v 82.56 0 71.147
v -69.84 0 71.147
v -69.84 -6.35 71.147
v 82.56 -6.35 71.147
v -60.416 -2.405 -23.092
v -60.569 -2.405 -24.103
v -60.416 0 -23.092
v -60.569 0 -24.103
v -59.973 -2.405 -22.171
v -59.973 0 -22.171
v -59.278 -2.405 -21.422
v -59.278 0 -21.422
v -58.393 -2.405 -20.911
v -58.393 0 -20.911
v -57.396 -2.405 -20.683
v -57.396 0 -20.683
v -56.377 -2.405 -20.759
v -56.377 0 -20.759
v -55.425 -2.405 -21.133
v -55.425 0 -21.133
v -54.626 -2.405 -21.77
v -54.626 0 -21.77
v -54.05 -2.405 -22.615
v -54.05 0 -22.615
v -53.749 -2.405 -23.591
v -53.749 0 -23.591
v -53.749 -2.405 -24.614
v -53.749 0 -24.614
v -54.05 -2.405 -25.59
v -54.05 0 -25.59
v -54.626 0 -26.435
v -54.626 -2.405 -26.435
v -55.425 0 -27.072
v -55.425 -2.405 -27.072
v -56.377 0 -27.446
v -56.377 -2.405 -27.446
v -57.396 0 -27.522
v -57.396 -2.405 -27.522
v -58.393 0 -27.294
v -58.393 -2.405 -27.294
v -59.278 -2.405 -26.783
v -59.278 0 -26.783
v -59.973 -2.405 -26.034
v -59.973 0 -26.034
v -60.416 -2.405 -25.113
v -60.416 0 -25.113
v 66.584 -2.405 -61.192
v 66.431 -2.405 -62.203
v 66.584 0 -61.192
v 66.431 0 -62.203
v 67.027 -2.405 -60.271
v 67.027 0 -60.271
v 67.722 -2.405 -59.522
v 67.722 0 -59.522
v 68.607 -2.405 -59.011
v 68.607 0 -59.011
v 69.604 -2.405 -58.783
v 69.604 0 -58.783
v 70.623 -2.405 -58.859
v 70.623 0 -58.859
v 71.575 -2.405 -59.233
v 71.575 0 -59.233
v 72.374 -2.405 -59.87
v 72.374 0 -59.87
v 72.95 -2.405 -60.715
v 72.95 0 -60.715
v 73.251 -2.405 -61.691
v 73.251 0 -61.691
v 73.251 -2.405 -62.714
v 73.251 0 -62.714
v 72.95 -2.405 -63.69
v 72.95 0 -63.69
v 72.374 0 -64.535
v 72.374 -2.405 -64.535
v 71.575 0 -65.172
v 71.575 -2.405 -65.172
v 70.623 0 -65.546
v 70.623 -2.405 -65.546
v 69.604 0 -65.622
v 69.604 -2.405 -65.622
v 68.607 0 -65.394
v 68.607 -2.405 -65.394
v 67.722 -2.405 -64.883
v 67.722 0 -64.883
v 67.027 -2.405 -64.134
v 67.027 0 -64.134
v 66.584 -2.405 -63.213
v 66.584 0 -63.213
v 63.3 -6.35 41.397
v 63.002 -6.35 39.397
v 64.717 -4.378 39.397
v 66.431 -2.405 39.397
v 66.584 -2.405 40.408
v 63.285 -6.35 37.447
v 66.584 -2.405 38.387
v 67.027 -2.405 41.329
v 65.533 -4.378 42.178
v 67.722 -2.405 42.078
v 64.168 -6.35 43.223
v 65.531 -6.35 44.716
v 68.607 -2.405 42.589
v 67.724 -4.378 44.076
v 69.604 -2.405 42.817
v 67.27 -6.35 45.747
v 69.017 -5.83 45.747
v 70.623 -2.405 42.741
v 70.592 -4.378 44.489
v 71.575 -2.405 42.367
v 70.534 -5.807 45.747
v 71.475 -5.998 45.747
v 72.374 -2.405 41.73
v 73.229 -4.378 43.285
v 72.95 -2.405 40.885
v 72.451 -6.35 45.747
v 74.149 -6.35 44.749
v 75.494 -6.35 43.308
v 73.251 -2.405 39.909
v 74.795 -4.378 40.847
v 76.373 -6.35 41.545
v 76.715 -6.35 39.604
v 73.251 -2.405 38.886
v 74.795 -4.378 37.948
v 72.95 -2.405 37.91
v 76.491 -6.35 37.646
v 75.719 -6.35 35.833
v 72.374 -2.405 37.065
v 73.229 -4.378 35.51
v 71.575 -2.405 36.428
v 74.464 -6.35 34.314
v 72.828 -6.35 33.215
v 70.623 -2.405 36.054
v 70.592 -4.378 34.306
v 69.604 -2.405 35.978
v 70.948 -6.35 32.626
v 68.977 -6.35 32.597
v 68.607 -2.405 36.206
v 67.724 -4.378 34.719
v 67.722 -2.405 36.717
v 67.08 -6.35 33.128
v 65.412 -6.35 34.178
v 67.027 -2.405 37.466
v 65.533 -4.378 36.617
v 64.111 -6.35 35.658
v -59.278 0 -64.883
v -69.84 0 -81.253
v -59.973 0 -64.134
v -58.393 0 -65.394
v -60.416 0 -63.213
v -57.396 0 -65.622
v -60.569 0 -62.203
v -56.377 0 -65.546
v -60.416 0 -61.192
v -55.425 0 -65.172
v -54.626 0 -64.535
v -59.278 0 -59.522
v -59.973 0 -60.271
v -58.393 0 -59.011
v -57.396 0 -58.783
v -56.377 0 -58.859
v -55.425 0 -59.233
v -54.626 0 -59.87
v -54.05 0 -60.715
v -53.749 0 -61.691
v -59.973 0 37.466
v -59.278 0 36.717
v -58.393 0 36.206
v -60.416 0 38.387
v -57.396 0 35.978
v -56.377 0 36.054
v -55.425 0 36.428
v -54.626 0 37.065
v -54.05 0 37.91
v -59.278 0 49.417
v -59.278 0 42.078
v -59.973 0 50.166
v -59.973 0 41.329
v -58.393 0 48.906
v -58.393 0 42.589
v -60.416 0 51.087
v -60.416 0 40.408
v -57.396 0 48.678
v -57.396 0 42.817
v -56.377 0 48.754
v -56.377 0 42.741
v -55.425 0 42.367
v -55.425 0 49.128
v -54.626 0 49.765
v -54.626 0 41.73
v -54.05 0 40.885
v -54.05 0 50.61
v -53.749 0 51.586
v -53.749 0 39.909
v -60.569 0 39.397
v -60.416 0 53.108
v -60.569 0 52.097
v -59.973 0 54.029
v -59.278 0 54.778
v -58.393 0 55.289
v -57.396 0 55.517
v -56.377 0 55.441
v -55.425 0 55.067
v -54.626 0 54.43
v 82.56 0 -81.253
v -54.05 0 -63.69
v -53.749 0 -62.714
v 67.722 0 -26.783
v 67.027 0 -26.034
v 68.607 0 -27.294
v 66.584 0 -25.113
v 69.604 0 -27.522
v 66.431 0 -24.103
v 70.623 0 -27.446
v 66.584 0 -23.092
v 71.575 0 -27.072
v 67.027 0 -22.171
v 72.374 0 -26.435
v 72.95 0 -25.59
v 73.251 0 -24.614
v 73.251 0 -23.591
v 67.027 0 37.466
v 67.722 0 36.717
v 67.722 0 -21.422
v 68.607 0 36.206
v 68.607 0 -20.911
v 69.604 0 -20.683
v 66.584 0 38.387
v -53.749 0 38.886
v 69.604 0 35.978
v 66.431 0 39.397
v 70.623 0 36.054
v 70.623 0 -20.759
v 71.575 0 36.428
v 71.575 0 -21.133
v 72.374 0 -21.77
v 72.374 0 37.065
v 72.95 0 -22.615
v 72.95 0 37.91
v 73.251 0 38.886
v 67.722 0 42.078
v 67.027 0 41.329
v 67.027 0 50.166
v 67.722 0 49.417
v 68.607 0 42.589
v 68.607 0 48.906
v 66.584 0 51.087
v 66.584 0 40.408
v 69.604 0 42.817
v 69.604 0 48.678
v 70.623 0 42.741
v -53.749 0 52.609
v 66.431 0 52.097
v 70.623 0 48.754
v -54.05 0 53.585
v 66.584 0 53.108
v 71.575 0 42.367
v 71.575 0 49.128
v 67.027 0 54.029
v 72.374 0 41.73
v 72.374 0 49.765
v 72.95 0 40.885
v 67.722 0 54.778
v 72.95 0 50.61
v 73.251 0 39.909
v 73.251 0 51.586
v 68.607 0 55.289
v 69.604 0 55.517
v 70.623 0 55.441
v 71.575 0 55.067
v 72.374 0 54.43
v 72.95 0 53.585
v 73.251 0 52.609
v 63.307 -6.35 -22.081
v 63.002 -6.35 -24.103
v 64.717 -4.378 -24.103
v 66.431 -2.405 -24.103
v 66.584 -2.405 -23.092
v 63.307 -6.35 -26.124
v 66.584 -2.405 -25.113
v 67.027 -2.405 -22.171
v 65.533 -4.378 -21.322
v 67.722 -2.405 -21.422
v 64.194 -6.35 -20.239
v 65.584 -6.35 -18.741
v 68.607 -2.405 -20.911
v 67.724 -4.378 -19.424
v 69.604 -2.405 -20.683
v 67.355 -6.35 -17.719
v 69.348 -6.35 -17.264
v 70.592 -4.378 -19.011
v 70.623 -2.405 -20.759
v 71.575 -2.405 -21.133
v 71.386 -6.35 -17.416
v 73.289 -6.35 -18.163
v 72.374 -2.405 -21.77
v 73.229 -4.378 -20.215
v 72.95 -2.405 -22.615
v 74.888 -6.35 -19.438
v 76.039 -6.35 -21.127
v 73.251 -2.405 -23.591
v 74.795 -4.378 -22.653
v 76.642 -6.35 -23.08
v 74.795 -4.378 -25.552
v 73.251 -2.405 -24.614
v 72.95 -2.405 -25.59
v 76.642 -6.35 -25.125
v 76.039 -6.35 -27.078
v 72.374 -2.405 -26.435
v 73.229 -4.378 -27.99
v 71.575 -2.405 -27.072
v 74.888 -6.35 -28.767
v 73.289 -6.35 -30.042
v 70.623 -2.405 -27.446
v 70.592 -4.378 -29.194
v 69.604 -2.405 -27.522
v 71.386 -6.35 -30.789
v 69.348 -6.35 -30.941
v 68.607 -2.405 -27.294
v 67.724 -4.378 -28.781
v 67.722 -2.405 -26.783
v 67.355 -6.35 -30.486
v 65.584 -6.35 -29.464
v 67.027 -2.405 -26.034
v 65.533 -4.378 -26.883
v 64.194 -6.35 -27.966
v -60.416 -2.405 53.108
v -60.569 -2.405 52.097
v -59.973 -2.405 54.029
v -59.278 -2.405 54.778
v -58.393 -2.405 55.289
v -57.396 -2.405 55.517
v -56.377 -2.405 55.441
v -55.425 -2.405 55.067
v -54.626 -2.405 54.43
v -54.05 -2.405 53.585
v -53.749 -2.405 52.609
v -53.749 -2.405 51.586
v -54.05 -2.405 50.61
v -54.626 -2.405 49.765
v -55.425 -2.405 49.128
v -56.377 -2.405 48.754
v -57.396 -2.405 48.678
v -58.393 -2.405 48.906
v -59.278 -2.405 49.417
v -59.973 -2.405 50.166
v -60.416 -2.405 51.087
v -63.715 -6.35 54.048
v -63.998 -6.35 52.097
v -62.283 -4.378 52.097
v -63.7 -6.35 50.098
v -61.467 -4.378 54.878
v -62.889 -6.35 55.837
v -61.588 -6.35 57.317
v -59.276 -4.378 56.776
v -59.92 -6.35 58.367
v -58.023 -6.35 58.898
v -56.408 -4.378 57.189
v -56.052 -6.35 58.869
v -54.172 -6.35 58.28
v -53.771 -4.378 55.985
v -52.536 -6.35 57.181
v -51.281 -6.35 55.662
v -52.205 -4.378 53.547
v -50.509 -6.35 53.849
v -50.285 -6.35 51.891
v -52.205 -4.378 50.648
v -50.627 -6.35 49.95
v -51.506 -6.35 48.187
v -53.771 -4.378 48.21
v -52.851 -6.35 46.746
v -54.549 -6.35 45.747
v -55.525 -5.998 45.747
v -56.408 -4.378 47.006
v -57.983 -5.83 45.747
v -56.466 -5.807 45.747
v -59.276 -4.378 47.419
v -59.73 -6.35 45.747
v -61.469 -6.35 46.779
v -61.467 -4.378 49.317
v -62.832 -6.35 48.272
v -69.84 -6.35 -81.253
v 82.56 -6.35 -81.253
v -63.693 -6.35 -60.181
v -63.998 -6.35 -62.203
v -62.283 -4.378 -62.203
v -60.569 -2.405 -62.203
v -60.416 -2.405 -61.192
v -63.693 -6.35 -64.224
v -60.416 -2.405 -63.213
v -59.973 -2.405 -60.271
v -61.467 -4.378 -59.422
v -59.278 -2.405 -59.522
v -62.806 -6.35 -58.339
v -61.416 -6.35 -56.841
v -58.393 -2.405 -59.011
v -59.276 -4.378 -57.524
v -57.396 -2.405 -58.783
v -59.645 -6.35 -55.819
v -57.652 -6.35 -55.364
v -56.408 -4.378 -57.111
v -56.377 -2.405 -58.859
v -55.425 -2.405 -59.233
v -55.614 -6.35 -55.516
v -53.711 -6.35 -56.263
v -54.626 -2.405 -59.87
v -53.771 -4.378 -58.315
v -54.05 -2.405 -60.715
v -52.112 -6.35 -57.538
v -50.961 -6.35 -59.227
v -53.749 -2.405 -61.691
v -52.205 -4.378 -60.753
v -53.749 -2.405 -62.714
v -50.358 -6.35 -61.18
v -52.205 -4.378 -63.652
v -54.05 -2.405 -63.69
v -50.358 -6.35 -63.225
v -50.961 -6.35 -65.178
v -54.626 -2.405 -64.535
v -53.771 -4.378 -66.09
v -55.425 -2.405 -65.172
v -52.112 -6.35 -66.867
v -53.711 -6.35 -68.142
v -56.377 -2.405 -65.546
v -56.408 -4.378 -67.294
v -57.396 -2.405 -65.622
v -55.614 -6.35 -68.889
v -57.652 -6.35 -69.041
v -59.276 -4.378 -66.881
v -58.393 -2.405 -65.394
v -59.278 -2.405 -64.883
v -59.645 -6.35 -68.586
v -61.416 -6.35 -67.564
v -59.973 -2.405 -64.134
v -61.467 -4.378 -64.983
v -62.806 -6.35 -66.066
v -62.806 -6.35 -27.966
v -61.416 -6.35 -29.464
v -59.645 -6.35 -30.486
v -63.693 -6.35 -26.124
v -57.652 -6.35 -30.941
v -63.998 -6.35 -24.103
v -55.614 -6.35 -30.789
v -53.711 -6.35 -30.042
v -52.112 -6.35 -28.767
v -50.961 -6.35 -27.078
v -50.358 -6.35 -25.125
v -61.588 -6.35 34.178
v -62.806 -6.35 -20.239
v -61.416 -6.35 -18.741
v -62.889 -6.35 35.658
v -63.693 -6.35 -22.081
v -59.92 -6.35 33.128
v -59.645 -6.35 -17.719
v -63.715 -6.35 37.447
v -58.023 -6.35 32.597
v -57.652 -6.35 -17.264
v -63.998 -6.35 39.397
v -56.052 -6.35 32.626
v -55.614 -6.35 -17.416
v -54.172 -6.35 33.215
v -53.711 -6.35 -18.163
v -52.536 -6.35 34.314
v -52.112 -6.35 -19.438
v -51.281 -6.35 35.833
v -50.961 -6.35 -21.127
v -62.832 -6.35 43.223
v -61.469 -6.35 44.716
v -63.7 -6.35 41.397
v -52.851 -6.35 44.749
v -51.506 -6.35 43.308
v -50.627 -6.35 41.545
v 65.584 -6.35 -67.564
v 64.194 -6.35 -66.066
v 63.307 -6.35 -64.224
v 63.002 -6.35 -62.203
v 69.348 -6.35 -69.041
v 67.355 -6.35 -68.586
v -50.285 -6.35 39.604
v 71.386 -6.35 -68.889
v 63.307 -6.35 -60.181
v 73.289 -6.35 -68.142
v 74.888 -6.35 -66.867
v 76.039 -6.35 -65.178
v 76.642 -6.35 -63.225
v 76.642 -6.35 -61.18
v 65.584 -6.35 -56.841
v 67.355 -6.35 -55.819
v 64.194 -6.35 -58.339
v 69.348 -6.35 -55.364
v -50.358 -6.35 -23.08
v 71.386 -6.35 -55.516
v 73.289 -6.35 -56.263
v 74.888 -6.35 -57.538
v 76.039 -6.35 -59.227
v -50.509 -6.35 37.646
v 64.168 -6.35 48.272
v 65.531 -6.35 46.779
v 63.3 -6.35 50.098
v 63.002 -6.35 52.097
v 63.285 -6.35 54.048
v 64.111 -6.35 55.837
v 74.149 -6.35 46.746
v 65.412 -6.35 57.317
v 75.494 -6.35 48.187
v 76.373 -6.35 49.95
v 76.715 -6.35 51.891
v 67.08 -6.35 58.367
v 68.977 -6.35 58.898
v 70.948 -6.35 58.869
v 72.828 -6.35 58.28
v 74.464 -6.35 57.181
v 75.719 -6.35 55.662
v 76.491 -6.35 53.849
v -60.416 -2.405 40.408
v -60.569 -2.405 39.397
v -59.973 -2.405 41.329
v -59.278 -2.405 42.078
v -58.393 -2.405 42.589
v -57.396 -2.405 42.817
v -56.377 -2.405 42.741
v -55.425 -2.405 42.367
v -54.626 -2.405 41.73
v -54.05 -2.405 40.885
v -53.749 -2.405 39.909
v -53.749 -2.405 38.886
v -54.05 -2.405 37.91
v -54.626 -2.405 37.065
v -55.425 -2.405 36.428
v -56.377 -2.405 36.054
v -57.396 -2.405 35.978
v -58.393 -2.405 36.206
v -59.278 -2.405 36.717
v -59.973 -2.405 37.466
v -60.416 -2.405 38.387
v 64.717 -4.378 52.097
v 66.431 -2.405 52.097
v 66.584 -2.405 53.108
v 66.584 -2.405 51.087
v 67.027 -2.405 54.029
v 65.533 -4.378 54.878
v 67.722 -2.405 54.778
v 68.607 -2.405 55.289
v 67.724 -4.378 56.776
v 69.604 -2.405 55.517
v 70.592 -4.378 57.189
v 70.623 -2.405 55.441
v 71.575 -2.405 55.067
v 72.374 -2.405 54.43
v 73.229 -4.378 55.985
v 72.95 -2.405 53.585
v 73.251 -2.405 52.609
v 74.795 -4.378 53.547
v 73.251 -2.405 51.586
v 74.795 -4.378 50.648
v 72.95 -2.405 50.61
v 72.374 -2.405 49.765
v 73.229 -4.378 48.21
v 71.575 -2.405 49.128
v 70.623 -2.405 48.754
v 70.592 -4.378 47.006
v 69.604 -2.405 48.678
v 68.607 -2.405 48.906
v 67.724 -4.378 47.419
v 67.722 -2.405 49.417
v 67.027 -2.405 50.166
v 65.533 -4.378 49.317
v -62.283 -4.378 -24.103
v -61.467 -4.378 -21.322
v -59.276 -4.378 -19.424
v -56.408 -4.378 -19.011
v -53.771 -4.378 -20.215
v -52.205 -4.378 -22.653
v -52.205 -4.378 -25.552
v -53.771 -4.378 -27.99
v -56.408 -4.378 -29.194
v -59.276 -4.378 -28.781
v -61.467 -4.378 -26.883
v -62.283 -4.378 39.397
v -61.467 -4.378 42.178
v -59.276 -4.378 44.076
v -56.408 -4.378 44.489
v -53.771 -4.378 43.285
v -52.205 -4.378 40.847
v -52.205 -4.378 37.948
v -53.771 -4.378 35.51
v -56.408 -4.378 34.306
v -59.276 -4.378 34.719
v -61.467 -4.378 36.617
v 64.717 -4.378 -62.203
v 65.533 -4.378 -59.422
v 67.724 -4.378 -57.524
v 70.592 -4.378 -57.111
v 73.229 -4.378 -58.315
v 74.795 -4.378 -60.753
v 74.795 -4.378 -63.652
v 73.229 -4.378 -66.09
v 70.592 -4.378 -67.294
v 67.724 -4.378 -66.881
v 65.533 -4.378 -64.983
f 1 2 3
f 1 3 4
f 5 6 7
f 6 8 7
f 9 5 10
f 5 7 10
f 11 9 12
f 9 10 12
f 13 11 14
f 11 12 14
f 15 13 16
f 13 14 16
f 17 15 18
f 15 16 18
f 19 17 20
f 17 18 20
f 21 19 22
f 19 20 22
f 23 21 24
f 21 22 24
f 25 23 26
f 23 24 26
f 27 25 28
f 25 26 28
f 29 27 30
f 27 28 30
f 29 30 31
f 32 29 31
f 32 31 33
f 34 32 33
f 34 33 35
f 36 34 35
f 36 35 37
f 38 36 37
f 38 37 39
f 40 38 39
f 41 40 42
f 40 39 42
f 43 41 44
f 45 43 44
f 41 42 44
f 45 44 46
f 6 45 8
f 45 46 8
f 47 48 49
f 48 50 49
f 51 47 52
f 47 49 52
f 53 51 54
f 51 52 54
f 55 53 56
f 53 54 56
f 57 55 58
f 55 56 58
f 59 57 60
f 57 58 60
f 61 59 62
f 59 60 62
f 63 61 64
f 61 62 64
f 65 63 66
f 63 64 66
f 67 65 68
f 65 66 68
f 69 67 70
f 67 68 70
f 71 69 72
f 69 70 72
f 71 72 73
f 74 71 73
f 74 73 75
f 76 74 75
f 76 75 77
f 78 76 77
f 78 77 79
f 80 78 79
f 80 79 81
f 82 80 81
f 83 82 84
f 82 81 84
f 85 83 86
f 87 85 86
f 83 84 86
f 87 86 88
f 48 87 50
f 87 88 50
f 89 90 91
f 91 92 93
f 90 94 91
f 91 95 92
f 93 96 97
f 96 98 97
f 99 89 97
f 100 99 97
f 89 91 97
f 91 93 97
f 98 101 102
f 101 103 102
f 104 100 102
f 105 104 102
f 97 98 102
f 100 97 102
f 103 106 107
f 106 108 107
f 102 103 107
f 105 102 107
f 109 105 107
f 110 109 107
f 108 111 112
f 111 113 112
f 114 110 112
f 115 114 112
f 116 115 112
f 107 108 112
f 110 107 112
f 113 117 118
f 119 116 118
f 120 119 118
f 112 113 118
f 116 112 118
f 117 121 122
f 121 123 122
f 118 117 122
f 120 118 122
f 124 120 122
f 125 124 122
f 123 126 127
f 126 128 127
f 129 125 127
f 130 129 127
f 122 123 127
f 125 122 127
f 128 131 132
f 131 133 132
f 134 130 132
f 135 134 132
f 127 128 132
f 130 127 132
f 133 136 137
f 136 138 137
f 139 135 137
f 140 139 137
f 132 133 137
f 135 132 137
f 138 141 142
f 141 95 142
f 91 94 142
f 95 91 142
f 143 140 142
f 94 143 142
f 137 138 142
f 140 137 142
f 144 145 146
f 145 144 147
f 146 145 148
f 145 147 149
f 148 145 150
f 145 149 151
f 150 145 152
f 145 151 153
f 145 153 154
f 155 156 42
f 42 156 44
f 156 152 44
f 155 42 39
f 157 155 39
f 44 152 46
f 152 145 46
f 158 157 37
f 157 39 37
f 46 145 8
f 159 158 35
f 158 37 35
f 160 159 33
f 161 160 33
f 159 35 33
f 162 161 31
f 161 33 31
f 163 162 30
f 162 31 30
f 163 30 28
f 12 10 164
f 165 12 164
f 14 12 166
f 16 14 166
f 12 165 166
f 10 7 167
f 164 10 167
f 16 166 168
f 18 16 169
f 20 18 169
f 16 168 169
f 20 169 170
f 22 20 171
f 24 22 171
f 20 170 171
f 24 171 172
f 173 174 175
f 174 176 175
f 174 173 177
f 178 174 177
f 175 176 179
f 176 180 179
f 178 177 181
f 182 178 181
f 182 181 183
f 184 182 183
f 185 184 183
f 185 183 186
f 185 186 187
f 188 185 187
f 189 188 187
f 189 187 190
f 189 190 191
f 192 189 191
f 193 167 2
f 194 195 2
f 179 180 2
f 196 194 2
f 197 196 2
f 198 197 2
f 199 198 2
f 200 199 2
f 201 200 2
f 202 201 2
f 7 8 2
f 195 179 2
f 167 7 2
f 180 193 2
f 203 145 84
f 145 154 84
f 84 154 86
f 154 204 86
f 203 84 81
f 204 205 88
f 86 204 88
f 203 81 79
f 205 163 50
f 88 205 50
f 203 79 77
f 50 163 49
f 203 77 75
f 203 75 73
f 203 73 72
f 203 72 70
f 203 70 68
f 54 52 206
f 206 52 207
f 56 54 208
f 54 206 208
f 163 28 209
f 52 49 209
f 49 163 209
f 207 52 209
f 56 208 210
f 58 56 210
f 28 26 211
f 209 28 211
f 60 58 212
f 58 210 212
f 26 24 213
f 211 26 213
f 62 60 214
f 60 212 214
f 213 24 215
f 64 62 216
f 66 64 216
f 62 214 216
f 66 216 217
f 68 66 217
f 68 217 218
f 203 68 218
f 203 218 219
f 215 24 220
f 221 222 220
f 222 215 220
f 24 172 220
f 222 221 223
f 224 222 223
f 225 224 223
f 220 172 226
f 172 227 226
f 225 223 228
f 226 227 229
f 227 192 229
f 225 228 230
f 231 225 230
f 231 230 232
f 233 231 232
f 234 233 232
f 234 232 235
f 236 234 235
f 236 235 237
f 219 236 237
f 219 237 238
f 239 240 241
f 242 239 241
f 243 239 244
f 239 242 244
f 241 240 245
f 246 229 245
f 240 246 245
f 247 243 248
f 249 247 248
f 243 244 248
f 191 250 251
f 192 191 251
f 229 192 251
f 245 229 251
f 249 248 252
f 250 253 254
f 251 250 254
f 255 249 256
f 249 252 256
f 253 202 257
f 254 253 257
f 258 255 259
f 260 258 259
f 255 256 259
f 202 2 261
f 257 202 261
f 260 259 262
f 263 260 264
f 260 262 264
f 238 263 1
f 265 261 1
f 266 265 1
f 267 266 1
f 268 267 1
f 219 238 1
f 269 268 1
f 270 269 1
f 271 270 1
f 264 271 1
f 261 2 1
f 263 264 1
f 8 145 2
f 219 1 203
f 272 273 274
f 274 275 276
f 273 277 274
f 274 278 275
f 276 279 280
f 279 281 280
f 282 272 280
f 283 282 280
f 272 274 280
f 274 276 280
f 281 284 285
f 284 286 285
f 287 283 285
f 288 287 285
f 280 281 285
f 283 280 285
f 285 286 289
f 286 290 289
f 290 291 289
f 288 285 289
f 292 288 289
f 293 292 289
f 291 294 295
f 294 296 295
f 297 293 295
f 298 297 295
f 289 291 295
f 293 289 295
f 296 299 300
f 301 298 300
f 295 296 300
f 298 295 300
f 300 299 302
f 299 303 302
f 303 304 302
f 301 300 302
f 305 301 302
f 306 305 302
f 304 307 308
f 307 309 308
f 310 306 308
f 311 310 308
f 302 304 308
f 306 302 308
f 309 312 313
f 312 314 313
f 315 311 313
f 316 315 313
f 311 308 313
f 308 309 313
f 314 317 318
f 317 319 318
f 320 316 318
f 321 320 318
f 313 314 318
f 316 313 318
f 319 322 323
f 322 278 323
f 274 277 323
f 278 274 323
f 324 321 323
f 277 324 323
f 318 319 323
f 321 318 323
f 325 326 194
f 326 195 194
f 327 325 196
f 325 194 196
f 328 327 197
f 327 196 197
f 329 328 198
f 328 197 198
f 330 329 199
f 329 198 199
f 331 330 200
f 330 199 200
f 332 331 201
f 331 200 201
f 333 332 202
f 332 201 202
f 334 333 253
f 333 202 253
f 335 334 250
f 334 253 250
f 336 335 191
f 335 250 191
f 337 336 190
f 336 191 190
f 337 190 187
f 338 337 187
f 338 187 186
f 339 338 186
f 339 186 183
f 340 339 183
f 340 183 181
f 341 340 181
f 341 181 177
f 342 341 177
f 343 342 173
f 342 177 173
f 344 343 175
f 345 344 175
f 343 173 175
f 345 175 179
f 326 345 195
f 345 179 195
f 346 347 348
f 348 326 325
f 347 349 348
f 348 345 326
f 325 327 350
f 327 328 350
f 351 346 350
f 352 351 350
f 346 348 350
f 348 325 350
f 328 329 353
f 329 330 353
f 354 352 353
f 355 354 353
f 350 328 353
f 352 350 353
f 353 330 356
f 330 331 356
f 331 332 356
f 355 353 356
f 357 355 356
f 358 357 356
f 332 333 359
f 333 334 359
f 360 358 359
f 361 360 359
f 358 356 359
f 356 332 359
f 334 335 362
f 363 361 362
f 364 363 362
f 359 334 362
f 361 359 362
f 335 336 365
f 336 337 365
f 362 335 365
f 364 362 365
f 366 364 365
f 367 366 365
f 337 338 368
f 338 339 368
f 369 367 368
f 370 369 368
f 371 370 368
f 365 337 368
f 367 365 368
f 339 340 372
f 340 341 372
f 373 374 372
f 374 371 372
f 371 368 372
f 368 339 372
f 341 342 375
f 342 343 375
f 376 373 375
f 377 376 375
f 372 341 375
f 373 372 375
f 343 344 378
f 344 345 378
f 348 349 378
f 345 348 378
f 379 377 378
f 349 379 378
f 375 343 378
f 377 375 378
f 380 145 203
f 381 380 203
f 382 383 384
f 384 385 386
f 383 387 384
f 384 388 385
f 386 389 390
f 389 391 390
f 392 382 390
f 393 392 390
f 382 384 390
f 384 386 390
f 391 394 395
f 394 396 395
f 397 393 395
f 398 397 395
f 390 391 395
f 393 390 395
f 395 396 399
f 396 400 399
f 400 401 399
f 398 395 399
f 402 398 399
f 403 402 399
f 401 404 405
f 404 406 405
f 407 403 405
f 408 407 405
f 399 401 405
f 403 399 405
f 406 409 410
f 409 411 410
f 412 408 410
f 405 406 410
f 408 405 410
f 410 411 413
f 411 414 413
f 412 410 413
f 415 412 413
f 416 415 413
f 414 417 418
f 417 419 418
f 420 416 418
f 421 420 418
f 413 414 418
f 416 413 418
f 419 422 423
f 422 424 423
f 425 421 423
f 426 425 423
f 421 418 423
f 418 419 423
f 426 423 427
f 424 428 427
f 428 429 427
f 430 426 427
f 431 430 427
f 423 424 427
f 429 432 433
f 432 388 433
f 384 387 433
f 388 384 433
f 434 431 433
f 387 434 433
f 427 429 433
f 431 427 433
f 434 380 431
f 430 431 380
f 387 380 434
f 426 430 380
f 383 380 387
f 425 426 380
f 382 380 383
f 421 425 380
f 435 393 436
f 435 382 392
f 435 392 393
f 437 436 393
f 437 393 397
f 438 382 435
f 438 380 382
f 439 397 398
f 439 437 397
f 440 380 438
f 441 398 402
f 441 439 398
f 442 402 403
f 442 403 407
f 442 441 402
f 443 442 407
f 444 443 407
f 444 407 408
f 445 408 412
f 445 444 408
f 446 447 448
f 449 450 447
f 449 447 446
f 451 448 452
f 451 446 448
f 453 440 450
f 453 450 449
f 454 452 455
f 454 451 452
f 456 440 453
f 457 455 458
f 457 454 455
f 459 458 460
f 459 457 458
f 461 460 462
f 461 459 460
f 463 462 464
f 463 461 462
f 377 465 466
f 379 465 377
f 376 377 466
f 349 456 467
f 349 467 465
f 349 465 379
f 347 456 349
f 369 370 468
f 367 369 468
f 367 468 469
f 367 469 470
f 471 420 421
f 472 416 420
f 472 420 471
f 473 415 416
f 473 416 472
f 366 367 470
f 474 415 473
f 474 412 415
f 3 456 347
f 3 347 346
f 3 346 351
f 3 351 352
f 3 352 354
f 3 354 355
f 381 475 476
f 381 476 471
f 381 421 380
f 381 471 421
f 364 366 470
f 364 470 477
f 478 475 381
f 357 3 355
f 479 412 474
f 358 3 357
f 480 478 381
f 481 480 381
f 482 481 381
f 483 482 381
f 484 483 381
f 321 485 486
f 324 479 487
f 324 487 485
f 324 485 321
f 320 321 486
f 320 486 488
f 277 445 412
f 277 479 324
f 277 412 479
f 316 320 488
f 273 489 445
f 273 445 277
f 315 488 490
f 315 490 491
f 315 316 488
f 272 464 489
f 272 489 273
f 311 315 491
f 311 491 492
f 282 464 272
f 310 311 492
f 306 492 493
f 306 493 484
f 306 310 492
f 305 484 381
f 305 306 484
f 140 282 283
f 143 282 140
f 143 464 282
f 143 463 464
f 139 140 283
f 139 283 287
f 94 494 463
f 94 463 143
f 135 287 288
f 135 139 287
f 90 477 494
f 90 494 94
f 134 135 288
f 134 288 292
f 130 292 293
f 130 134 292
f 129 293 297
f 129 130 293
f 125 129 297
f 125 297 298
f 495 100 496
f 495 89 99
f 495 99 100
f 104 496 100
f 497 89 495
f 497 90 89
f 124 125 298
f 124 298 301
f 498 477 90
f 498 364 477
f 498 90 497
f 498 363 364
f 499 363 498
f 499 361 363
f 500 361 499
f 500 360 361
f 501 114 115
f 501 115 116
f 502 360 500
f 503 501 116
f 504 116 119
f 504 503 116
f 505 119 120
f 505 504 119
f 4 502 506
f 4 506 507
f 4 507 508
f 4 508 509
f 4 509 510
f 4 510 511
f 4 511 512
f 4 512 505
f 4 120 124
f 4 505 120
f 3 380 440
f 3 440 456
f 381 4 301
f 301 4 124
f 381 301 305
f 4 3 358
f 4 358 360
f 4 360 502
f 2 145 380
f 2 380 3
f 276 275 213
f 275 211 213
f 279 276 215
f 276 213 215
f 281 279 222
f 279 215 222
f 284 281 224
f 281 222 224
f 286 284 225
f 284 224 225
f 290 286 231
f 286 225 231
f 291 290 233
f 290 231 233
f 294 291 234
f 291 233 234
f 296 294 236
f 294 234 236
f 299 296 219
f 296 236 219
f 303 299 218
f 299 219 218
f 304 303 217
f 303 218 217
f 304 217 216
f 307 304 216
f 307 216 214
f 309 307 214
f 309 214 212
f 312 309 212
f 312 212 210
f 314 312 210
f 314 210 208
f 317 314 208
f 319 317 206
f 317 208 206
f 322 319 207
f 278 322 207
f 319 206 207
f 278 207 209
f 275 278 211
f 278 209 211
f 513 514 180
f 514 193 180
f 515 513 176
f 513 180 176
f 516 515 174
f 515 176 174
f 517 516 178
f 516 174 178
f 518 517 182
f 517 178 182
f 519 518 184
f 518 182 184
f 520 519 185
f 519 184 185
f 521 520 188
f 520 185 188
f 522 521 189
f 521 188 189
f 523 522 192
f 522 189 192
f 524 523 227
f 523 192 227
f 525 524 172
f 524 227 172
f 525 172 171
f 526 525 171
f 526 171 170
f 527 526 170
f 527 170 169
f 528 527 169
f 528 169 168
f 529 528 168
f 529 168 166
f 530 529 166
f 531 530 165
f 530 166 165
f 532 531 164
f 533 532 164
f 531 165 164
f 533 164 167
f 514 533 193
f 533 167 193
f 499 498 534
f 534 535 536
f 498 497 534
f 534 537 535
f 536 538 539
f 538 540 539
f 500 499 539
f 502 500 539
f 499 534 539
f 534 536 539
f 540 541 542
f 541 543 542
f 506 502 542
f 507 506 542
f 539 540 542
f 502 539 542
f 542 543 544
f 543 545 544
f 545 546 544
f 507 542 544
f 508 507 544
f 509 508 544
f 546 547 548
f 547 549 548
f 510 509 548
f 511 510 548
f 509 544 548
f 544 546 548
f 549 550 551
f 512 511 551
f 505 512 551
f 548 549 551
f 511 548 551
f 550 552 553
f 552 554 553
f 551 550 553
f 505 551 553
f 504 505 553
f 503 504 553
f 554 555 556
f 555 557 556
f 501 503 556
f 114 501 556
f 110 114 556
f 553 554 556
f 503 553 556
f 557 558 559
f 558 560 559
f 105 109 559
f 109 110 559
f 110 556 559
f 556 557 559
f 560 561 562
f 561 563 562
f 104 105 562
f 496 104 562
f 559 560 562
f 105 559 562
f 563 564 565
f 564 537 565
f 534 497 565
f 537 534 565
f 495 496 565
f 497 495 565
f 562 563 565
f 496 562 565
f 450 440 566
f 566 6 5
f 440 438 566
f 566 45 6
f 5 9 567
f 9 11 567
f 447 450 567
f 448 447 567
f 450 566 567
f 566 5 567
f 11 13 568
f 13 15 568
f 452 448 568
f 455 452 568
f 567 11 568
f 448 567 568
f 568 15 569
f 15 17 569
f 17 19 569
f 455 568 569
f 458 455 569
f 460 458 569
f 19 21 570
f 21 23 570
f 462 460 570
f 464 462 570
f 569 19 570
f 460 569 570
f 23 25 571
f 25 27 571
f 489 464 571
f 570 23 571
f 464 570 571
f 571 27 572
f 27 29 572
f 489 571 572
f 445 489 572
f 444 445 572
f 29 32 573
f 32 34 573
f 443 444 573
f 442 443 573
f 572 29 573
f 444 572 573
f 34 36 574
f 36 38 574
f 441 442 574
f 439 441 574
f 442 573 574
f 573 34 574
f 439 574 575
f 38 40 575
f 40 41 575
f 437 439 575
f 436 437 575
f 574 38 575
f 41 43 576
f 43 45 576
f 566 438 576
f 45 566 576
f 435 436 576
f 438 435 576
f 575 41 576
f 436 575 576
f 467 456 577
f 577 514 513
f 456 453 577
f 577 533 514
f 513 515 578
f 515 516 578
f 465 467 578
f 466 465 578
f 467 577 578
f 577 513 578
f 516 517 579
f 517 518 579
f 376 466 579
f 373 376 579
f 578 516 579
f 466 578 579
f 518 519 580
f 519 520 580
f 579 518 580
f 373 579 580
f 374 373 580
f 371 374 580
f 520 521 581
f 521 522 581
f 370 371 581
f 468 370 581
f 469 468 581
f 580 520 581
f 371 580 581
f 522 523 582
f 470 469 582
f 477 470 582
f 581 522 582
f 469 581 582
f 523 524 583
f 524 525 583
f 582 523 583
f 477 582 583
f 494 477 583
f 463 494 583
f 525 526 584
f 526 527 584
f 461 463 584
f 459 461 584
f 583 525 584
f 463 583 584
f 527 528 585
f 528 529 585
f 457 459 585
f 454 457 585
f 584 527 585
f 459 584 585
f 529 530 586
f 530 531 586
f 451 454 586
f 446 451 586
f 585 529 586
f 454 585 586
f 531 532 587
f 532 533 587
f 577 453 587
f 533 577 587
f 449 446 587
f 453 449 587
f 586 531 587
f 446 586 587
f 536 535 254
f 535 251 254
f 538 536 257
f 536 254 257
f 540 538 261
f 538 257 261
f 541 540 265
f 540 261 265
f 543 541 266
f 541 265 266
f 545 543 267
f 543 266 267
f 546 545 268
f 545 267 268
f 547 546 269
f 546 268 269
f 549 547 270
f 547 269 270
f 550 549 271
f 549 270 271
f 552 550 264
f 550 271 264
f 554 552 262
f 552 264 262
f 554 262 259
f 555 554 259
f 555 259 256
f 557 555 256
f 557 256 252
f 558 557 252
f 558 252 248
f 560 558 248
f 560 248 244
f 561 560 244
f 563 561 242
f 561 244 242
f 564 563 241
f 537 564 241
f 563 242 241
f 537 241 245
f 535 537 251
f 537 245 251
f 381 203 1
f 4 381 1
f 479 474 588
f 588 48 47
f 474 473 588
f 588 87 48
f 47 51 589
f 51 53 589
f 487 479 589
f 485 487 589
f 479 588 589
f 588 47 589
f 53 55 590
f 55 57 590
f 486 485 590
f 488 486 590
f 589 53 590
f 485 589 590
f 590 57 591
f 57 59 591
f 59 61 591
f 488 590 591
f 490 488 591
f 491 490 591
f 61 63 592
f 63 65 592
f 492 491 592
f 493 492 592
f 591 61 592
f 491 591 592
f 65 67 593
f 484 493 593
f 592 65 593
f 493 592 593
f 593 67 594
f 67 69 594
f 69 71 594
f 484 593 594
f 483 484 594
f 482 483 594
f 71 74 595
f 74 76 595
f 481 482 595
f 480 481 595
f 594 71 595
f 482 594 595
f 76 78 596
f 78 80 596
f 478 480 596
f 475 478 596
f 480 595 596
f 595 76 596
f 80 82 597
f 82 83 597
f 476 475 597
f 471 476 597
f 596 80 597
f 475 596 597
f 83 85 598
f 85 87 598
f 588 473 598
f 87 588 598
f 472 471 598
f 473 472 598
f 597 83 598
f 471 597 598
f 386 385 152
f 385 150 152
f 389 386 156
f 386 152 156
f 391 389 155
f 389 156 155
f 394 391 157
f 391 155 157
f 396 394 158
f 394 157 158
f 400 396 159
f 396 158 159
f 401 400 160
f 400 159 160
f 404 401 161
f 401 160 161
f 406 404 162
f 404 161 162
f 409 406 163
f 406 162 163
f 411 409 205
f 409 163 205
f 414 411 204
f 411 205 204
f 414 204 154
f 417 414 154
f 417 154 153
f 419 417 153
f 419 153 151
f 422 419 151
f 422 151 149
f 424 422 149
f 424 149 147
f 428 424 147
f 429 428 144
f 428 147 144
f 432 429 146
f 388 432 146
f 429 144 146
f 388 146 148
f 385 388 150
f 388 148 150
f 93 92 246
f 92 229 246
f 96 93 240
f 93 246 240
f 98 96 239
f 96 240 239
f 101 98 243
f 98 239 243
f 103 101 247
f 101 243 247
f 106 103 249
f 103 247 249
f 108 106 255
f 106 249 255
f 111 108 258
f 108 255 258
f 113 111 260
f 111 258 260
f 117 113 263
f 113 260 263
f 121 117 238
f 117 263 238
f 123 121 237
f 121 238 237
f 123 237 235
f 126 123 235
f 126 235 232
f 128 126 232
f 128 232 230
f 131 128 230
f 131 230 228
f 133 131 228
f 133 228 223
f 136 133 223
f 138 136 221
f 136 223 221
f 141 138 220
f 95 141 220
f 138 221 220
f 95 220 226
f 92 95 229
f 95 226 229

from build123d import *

# Parameters (mm, degrees)
F0_W           = 152.4
F0_H           = 152.4
F1_DEPTH       = 6.35
F3_D           = 6.858
F3_CSINK_D     = 13.716
F3_CSINK_ANGLE = 82


with BuildPart() as f1:
    # F0 (on Front) → F1 (new body)
    with BuildSketch(Plane.XZ):
        with Locations((6.360243, -5.05251)):
            Rectangle(F0_W, F0_H)
    extrude(amount=F1_DEPTH)

    # F3 (through all)
    with Locations(Plane.XZ.offset(6.35)):
        with Locations((-57.139757, 52.09749), (-57.139757, 39.39749), (69.860243, 52.09749), (69.860243, 39.39749), (69.860243, -24.10251), (69.860243, -62.20251), (-57.139757, -62.20251), (-57.139757, -24.10251)):
            CounterSinkHole(F3_D / 2, F3_CSINK_D / 2, counter_sink_angle=F3_CSINK_ANGLE)


solid = f1.part
